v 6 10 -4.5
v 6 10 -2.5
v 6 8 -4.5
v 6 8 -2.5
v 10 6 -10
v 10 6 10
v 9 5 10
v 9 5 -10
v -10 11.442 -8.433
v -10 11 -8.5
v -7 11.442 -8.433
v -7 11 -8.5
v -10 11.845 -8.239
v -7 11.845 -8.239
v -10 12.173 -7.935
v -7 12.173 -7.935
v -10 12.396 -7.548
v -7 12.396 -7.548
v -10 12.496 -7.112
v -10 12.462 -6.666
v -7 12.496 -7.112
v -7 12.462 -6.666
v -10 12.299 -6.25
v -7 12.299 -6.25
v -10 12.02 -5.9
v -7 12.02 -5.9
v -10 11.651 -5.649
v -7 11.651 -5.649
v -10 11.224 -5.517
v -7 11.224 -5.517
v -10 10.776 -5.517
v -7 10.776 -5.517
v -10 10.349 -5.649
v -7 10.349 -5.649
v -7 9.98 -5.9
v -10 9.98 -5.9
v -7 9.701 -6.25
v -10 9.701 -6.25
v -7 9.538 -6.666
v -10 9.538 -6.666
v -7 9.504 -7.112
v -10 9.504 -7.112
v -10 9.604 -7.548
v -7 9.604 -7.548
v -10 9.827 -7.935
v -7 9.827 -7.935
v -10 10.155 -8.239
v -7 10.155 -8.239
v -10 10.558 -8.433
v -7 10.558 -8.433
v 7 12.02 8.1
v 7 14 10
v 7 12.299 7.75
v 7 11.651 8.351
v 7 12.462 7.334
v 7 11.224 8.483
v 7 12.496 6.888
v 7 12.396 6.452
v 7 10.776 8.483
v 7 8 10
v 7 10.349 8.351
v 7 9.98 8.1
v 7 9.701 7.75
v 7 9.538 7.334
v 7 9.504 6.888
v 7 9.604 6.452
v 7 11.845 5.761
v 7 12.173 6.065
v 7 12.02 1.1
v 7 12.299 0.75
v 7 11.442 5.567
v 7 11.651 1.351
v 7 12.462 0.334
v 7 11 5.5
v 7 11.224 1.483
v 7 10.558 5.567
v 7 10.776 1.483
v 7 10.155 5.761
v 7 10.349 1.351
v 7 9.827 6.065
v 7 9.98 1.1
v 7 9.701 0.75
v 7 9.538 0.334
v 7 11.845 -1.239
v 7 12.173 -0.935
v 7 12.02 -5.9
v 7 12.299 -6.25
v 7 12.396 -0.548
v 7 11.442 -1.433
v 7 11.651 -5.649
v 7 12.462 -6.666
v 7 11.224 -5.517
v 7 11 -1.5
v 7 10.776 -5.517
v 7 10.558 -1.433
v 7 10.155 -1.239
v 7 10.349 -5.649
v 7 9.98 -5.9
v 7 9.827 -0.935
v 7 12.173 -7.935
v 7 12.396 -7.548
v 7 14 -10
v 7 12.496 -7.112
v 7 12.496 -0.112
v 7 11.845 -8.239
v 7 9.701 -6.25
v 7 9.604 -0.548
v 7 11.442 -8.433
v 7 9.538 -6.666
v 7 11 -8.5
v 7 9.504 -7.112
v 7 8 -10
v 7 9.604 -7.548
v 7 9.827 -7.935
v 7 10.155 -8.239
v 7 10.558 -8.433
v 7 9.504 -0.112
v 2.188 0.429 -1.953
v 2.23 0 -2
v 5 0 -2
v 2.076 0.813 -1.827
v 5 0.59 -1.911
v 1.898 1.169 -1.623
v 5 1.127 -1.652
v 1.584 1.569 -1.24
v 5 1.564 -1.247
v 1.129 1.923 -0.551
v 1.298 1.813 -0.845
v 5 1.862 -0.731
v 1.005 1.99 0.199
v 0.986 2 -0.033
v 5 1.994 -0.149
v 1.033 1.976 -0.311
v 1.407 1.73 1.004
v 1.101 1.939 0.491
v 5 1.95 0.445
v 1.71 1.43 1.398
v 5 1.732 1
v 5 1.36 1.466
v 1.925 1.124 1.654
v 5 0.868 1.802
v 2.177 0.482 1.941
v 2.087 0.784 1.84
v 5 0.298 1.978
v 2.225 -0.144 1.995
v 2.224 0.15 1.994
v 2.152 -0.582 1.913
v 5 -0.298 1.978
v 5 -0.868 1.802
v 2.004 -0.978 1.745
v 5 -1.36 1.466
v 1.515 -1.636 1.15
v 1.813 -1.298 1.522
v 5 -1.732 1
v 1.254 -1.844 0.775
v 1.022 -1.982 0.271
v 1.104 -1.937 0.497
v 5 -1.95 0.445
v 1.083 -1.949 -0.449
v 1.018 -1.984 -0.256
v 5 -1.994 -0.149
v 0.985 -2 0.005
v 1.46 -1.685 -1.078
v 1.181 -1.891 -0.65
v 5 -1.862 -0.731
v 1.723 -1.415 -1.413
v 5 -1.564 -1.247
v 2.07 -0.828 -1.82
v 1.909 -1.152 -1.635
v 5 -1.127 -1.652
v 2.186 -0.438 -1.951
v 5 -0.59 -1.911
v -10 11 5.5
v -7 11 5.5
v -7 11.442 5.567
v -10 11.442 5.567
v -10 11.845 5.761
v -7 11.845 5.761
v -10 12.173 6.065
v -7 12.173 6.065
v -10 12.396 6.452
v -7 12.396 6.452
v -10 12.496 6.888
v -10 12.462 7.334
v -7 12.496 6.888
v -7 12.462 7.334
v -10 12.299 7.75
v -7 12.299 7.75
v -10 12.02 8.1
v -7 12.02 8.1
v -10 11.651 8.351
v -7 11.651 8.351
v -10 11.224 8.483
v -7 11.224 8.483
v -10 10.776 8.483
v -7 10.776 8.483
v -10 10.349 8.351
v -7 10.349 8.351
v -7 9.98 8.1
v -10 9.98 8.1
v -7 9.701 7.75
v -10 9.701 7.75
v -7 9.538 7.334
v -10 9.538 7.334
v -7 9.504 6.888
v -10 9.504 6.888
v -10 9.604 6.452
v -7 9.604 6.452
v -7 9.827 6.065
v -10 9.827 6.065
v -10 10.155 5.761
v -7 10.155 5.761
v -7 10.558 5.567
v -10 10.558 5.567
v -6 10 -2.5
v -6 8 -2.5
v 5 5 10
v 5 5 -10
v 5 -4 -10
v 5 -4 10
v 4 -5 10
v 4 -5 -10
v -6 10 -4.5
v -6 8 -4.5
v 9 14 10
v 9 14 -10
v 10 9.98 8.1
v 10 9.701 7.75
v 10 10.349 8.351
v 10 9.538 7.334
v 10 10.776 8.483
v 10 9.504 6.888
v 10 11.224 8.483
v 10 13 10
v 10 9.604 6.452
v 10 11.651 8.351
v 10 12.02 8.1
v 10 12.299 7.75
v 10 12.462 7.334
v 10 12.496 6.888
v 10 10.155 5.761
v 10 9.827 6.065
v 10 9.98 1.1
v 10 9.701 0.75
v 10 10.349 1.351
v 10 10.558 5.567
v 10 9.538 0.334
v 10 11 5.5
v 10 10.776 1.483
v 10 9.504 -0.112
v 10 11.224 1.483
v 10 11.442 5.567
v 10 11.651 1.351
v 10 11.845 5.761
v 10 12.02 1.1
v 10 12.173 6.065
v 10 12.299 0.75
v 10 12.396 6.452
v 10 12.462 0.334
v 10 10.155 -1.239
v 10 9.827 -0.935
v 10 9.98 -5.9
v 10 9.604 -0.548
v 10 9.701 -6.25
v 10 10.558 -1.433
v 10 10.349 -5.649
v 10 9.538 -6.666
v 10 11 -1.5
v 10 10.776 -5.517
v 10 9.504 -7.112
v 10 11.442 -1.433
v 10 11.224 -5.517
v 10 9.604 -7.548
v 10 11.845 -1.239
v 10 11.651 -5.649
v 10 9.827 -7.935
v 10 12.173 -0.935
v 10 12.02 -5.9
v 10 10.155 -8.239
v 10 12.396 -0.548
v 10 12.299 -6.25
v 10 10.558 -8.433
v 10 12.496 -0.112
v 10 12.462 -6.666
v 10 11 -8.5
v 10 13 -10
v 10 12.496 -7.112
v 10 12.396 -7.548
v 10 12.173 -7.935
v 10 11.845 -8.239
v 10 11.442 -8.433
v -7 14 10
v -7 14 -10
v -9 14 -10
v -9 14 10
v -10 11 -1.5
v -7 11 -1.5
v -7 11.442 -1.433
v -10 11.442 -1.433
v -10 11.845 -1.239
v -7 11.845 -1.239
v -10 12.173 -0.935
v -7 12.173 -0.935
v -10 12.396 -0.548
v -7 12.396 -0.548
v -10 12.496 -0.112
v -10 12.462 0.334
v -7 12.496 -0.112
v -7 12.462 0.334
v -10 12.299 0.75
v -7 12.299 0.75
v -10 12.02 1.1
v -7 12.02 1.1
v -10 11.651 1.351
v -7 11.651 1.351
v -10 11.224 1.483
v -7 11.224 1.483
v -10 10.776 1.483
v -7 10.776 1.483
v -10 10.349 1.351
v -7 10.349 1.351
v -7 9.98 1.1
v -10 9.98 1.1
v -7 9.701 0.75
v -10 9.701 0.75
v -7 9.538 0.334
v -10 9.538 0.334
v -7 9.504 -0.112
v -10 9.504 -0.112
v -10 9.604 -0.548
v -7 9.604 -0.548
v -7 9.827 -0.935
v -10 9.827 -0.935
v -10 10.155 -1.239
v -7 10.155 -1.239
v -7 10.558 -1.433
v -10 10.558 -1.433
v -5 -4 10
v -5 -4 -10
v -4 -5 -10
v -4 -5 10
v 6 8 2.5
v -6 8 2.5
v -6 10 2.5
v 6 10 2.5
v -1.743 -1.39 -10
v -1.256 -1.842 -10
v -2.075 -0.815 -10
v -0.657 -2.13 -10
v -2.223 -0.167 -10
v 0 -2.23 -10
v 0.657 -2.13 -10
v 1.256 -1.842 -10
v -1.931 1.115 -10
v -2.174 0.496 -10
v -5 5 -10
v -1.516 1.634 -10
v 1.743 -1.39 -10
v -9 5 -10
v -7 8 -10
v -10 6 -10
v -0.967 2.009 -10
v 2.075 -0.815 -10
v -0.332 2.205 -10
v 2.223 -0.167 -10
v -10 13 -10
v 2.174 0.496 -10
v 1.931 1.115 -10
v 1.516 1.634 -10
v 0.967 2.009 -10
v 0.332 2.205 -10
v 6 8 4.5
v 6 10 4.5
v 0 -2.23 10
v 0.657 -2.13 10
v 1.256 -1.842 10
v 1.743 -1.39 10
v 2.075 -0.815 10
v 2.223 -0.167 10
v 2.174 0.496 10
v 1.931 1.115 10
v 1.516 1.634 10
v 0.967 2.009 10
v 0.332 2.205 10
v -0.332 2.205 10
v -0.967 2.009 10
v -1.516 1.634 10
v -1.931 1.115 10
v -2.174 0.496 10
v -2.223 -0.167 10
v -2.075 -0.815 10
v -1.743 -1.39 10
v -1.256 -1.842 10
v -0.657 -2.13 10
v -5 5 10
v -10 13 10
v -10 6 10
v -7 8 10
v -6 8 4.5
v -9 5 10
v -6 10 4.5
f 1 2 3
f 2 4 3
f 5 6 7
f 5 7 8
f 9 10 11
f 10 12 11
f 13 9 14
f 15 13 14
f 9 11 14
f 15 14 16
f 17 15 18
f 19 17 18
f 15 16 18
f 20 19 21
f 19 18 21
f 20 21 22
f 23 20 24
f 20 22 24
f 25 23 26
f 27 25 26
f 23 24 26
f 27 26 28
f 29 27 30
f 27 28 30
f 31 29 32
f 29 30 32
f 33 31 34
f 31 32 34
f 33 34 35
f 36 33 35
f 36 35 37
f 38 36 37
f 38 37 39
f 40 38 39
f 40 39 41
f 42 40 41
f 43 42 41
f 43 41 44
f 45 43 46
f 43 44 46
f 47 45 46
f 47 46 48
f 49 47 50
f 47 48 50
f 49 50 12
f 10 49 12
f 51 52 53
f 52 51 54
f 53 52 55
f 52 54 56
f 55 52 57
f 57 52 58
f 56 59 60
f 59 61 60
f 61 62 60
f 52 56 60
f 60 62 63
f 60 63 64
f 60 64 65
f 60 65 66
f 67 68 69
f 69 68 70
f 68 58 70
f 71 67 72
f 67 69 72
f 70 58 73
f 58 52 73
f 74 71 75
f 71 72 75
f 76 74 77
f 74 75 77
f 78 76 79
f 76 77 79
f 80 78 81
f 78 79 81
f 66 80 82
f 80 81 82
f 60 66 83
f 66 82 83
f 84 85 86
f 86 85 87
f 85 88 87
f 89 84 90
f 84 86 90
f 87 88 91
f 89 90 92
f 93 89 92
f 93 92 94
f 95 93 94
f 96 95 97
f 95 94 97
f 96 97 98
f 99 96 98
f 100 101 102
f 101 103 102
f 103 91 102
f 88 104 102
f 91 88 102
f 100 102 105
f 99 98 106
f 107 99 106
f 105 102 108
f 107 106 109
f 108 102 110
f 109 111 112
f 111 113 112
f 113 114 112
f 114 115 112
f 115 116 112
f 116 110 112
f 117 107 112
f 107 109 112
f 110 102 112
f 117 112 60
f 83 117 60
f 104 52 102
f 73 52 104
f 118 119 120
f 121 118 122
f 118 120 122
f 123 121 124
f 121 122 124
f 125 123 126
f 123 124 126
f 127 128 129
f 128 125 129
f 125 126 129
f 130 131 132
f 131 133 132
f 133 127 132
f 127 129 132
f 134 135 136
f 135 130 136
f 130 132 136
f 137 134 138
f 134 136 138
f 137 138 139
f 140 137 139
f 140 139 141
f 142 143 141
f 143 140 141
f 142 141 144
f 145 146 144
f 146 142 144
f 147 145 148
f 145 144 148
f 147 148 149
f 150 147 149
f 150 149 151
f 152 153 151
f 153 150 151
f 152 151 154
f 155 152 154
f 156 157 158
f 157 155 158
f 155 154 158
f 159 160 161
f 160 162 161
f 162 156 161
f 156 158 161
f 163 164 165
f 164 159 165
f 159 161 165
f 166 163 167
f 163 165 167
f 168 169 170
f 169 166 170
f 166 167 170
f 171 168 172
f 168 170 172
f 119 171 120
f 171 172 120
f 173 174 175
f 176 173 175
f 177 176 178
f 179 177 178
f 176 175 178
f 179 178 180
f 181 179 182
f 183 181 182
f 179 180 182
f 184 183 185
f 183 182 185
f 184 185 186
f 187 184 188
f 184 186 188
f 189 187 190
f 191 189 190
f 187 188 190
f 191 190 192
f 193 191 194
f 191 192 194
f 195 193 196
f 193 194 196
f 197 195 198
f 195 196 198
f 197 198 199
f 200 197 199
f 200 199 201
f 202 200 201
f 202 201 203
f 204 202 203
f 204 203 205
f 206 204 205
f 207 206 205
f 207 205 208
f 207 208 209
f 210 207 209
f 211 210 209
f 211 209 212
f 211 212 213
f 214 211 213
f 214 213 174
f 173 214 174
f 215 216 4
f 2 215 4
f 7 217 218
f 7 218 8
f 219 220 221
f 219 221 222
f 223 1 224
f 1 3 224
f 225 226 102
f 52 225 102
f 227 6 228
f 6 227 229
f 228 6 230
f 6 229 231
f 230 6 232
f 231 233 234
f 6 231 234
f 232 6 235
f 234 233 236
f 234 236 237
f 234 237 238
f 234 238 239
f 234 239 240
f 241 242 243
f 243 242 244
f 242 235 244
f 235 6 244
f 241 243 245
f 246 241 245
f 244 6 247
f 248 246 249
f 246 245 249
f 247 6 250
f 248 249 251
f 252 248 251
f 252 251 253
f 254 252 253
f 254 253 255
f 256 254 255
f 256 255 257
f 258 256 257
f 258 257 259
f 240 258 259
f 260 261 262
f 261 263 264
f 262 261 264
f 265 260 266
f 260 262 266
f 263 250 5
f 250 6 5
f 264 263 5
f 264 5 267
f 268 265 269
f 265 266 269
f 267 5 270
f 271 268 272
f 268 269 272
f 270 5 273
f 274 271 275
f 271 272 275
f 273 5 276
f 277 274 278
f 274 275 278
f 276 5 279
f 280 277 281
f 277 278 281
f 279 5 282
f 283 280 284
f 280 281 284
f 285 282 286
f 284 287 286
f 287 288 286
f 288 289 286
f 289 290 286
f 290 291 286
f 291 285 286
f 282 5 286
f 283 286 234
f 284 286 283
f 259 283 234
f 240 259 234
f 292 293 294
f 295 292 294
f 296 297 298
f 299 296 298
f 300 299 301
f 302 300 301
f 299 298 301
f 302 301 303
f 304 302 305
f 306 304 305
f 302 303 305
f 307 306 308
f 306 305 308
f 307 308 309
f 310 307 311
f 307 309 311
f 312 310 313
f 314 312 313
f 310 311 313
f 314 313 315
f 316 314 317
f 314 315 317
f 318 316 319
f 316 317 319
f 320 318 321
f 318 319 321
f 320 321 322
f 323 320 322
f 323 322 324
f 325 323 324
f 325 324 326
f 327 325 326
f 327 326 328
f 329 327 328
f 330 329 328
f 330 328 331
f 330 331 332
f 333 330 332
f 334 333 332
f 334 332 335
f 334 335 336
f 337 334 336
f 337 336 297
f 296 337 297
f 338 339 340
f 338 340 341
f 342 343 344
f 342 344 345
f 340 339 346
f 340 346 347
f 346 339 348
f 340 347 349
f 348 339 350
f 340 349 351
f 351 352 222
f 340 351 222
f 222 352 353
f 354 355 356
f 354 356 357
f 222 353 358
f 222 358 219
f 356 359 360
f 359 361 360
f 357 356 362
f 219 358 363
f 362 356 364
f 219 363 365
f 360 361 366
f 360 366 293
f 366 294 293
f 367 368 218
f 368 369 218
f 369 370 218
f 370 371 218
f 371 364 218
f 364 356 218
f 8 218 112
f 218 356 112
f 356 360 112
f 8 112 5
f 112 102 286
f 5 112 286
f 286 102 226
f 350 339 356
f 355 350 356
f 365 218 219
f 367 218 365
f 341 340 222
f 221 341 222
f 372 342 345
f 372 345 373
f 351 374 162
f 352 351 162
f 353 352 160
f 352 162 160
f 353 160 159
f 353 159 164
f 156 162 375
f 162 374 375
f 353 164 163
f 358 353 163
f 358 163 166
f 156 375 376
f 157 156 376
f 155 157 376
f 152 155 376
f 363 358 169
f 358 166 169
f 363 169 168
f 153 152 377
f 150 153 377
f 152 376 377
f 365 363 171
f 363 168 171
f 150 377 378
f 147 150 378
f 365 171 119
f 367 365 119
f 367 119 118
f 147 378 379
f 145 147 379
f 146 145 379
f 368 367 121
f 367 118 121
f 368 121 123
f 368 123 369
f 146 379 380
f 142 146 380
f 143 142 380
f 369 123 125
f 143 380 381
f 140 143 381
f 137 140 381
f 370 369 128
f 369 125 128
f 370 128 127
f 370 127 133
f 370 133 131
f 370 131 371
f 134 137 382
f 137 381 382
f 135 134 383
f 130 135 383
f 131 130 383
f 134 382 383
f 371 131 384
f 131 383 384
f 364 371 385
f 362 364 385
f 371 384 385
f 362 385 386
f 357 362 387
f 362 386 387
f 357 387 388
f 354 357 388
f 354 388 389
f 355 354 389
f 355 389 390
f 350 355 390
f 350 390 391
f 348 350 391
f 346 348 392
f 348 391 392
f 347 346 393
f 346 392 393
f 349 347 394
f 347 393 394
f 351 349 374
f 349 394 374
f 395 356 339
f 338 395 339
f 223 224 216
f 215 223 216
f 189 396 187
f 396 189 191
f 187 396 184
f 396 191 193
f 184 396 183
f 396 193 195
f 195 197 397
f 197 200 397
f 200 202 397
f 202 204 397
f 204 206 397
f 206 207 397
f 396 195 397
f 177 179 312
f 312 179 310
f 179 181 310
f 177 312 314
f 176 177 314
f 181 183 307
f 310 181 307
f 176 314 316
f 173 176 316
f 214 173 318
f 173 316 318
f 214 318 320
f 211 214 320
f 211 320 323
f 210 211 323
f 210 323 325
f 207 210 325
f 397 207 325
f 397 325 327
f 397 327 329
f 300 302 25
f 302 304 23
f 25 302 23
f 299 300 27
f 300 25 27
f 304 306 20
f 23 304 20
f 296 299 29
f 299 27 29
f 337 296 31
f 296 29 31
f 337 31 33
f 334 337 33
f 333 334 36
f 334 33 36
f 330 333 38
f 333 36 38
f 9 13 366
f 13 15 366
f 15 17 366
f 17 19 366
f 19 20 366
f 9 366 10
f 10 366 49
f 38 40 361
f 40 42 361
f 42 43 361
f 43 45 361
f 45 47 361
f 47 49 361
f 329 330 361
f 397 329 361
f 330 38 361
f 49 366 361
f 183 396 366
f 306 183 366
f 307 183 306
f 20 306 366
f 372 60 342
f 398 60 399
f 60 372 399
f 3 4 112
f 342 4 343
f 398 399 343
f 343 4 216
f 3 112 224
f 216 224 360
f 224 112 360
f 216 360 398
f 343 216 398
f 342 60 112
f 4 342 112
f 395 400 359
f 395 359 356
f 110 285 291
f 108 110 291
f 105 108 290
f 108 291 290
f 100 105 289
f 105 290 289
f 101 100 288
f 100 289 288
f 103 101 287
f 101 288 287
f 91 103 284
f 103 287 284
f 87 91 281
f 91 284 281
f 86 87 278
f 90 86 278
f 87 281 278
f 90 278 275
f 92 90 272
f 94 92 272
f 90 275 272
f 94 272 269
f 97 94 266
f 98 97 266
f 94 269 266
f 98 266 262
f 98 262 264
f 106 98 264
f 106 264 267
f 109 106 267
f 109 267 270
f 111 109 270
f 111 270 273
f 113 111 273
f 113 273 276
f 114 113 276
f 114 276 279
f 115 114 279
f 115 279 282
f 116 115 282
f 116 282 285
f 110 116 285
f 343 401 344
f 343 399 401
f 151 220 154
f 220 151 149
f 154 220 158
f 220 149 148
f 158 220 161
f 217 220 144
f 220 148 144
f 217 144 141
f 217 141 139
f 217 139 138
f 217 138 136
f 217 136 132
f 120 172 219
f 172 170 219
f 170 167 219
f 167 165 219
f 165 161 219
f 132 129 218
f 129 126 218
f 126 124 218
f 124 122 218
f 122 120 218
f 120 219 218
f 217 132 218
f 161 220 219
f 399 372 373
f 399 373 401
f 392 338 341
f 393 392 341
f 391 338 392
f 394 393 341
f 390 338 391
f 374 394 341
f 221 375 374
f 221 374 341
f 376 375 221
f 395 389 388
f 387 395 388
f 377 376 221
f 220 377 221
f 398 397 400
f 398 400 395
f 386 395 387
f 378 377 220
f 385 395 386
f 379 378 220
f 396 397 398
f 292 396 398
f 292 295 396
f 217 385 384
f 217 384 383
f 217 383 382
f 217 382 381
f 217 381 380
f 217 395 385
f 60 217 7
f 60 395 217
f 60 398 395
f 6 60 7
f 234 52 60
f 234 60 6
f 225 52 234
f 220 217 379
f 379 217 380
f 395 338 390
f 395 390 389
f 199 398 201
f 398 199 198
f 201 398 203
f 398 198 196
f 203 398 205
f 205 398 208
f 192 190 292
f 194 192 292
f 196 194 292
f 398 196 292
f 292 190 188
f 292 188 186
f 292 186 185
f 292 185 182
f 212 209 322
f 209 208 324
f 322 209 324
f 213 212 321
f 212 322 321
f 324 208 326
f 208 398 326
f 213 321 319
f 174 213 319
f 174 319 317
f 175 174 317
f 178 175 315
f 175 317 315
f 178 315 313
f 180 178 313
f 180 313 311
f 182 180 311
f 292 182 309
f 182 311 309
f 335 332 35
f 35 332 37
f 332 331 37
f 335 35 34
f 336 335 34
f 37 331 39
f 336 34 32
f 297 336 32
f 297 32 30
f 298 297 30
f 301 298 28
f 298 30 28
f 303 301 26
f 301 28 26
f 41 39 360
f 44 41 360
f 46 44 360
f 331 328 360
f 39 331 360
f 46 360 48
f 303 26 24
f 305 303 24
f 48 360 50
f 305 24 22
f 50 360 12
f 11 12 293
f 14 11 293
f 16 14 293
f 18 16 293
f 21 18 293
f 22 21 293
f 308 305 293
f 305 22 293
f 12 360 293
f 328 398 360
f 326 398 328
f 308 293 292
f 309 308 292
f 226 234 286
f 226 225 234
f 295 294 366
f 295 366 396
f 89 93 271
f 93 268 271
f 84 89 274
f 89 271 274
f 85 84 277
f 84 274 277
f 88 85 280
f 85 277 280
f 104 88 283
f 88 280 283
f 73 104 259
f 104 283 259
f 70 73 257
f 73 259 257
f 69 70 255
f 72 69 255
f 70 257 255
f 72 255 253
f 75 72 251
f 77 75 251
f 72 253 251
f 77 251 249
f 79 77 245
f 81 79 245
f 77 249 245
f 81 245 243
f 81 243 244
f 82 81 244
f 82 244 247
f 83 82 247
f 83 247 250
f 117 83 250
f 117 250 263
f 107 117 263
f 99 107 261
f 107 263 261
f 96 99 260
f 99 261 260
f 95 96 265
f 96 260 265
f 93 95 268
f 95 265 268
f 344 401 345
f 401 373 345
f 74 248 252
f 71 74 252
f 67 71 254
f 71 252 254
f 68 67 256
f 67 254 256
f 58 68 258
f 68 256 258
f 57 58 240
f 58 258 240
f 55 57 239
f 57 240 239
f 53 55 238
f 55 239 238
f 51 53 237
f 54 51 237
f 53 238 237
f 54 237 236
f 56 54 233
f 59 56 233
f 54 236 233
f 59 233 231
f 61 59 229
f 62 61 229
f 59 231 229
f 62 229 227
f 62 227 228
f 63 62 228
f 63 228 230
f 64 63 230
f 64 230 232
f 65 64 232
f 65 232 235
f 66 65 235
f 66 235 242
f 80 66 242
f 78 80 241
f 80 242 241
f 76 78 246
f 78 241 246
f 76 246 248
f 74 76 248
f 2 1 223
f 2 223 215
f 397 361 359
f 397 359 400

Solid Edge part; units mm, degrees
sketch "Sketch1" plane through (0, 0, 0) normal (0, 0, 1) x (1, 0, 0)
  line L0 (-5, -5) -> (5, -5)
  line L1 (5, -5) -> (5, 5)
  line L2 (5, 5) -> (10, 5)
  line L3 (10, 5) -> (10, 14)
  line L4 (10, 14) -> (7, 14)
  line L5 (7, 14) -> (7, 8)
  line L6 (7, 8) -> (-7, 8)
  line L7 (-7, 8) -> (-7, 14)
  line L8 (-7, 14) -> (-10, 14)
  line L9 (-10, 14) -> (-10, 5)
  line L10 (-10, 5) -> (-5, 5)
  line L11 (-5, 5) -> (-5, -5)
  dimension "D1" = 10
  dimension "D2" = 10
  dimension "D3" = 5
  dimension "D4" = 9
  dimension "D5" = 6
  dimension "D6" = 14
extrude "Ajout_matière_1" add sketch "Sketch1" along normal mid plane 20
hole "Perçage_1" at (0, 0, 10) direction (0, 0, -1) diameter 4.459 end up to next
hole "Perçage_2" at (10, 11, 7) direction (-1, 0, 0) diameter 3 end through all
hole "Hole1" at (10, 11, 0) direction (-1, 0, 0) diameter 3 end through all
hole "Hole2" at (10, 11, -7) direction (-1, 0, 0) diameter 3 end through all
hole "Perçage_5" at (5, 0, 0) direction (-1, 0, 0) diameter 4 end up to next
chamfer "Chanfrein_1" distance 1 angle 45 6 edges at (10, 14, 0) (10, 5, 0) (-10, 14, 0) (-10, 5, 0) (-5, -5, 0) (5, -5, 0)
sketch "Sketch2" plane through (0, 8, 0) normal (0, 1, 0) x (0, 0, -1)
  line L0 (-4.5, 6) -> (-2.5, 6)
  line L1 (-2.5, 6) -> (-2.5, -6)
  line L2 (-2.5, -6) -> (-4.5, -6)
  line L3 (-4.5, -6) -> (-4.5, 6)
  line L4 (2.5, -6) -> (4.5, -6)
  line L5 (4.5, -6) -> (4.5, 6)
  line L6 (4.5, 6) -> (2.5, 6)
  line L7 (2.5, 6) -> (2.5, -6)
  dimension "D1" = 2.5
  dimension "D2" = 2
  dimension "D3" = 12
extrude "Ajout_matière_2" add sketch "Sketch2" along normal blind 2 and the other way blind 0.7497
properties material "Aluminium AU4G, 2024_T4"
